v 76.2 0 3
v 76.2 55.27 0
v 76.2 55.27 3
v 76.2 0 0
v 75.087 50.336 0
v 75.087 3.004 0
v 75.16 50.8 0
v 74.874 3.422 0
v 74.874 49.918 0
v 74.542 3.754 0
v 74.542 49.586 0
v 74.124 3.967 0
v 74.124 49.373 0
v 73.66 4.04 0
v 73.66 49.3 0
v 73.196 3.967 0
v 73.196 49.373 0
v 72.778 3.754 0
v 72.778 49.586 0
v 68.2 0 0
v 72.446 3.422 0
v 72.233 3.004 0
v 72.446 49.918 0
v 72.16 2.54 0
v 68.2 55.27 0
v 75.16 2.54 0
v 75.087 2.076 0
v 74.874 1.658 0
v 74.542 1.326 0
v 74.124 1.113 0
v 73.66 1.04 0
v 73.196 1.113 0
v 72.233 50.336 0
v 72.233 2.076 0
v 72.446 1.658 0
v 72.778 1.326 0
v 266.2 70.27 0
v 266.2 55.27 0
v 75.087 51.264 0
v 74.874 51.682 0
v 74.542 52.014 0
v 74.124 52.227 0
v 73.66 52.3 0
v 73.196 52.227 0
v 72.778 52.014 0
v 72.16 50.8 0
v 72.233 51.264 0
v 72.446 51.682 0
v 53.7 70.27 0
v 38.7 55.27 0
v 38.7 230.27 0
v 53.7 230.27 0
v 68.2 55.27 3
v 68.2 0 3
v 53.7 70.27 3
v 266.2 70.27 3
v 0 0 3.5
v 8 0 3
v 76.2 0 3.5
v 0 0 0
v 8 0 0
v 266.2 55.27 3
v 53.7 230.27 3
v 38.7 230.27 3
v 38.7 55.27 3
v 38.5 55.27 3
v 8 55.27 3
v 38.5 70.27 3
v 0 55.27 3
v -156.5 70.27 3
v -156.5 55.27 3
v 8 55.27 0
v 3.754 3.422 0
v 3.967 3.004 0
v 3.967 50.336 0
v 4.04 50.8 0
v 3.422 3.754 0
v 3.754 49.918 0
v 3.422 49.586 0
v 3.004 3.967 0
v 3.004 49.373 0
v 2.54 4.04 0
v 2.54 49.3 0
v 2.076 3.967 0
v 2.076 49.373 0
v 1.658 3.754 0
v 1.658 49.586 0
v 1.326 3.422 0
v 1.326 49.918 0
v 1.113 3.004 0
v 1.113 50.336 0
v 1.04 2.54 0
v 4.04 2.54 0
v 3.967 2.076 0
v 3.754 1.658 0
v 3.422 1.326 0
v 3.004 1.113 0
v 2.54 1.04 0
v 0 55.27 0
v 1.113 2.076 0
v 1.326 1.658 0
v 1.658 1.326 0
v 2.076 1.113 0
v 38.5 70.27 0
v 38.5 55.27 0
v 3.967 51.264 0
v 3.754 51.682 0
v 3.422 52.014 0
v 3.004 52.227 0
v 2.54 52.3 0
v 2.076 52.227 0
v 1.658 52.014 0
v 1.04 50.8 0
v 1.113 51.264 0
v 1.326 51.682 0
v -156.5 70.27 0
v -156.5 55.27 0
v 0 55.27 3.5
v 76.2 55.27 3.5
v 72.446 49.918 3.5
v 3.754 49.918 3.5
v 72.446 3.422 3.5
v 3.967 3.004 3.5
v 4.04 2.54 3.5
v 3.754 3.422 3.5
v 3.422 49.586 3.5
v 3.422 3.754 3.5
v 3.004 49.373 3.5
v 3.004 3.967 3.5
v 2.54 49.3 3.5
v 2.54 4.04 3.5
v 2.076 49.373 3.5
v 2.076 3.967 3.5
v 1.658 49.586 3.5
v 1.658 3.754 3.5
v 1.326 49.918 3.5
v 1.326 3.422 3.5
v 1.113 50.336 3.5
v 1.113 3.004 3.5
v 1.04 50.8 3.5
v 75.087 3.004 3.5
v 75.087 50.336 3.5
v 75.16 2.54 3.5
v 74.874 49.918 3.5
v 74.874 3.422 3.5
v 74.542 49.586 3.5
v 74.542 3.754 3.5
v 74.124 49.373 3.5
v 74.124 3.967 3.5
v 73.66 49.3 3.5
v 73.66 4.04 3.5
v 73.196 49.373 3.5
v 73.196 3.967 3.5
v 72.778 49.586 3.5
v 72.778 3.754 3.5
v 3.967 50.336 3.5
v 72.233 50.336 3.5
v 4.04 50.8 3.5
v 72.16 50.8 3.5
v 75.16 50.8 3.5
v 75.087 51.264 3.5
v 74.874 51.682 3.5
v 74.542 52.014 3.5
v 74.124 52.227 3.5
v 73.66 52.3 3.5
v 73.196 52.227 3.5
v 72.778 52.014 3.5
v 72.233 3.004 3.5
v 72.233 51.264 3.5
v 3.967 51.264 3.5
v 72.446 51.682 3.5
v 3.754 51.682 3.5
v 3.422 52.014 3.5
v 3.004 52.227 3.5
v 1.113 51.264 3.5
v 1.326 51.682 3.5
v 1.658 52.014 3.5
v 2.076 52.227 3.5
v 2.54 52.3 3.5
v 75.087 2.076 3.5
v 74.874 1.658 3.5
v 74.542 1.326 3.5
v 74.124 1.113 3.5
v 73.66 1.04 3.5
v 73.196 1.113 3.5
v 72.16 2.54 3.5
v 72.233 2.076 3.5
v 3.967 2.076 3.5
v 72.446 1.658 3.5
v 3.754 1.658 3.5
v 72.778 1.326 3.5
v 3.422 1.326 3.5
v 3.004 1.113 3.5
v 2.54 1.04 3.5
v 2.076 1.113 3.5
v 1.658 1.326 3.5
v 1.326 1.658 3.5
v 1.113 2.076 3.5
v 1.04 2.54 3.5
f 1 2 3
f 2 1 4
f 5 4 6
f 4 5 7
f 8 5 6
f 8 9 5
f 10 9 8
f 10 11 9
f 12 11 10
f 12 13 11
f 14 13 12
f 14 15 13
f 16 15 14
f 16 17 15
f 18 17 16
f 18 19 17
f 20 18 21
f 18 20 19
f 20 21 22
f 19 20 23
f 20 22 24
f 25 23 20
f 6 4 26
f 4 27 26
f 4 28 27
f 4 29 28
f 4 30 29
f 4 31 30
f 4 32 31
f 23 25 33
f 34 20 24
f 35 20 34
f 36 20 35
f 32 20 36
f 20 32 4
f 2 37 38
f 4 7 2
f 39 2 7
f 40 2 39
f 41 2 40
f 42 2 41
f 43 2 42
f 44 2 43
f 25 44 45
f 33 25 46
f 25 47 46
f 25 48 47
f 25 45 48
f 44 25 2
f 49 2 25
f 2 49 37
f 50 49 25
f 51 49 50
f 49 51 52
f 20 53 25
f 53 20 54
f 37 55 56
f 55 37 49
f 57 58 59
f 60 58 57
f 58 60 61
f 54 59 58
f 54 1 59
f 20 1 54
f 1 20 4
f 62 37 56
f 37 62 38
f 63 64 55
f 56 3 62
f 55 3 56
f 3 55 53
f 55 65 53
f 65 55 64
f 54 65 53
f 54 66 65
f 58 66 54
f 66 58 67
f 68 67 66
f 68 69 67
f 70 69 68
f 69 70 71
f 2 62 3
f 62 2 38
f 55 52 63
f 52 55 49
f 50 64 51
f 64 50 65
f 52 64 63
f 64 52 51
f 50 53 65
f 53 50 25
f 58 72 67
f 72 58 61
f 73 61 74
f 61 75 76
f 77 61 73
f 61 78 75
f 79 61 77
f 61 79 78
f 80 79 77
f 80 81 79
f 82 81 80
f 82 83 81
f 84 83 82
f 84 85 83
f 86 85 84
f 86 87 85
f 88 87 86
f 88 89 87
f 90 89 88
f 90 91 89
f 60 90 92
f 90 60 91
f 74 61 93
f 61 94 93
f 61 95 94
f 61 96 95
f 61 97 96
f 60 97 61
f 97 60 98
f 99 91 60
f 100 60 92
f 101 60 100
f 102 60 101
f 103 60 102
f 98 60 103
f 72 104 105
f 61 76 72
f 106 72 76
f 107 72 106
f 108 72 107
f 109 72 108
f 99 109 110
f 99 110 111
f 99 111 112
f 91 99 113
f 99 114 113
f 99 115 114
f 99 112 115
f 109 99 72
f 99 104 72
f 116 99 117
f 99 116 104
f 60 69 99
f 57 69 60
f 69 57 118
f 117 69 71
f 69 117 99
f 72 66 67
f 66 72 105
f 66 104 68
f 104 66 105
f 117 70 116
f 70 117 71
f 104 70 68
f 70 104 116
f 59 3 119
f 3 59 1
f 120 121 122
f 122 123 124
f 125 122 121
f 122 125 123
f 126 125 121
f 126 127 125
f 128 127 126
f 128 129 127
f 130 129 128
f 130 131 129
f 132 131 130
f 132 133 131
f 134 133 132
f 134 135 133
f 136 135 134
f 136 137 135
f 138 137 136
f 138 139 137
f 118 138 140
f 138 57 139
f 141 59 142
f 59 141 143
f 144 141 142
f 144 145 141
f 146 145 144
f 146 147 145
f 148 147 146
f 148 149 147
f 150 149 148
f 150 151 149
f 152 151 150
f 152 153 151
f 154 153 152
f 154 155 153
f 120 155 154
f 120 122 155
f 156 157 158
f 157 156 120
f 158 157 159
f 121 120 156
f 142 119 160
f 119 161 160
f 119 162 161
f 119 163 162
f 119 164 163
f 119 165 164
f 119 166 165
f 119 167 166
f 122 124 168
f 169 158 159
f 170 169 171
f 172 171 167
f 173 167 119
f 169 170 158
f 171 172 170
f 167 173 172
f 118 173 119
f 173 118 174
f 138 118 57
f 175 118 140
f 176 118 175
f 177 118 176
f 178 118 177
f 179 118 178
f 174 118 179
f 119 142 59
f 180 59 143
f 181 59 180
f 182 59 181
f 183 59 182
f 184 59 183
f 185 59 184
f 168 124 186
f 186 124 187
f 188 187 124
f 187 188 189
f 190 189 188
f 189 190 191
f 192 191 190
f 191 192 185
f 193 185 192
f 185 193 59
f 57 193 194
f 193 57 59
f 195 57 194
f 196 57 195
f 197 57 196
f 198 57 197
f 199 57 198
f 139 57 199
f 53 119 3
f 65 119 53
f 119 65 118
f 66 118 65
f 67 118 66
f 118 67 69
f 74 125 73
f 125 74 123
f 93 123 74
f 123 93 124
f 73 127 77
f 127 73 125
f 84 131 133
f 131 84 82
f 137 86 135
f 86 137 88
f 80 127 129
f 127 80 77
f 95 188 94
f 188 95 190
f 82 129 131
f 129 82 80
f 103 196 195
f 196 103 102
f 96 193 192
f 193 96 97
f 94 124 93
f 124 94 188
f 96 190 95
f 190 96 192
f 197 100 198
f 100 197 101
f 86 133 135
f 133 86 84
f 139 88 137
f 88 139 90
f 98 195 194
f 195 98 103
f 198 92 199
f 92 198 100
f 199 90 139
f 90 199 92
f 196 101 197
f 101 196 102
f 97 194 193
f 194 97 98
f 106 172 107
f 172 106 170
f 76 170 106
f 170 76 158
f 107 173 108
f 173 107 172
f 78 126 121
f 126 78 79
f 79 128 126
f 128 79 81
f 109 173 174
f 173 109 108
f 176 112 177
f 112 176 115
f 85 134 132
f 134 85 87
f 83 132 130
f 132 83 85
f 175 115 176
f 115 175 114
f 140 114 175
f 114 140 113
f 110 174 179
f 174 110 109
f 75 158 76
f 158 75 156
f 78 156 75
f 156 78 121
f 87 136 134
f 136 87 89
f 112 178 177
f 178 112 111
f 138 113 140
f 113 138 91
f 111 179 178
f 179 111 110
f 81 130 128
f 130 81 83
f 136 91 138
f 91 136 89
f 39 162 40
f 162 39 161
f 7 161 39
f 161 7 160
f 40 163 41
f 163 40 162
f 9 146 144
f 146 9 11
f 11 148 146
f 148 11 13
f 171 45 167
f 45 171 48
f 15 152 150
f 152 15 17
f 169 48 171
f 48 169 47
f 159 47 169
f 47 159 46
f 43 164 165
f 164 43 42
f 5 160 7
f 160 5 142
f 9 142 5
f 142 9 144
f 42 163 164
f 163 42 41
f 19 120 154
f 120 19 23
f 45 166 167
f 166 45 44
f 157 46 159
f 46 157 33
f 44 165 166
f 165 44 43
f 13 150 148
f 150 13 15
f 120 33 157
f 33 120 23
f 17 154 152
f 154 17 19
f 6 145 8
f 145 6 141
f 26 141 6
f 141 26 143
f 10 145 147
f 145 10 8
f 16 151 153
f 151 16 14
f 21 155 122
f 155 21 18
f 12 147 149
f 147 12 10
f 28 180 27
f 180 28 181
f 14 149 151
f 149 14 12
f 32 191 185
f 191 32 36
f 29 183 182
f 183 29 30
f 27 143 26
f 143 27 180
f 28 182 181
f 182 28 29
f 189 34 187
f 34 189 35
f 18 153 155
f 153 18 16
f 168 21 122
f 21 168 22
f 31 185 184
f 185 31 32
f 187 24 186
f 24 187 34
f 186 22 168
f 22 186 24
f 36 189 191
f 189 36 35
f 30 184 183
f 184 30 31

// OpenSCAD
//2024 Oxford Aerospace and Rocketry Society
//Layout for the tracker / reciever PCB
//Comment out each individual part to print

$fn = 20; //20 Sides for each hole

difference(){
    union(){
        color("DodgerBlue",1) //PCB
        translate([0,0,3])
            cube([76.2,55.27,0.5]);
        
        translate([76.2-8,0,0])
            union(){
                color("ForestGreen", 1)
                    rightSide();
                color("FireBrick", 1)
                    topSide();
            }
        color("DarkSlateGray", 1)
            leftSide();
    }
        translate([2.54,2.54,0])//Mounting Holes
            cylinder(r = 1.5, h = 4);
        translate([2.54,50.8,0])
            cylinder(r = 1.5, h = 4);
        translate([73.66,50.8,0])
            cylinder(r = 1.5, h = 4);
        translate([73.66,2.54,0])
            cylinder(r = 1.5, h = 4);
}


module rightSide(){
    cube([8,55.27+15,1.5]);
    translate([8,55.27,0])
        cube([190,15,3]);
}

module topSide(){
    translate([0,0,1.5])
        cube([8,55.27+15,1.5]);
    translate([-22-7.5,55.27,0])
        cube([15,175,3]);
    translate([-22+7.5,55.27,0])
        cube([22-7.5,15,3]);
    
}

module leftSide(){
    cube([8,55.27,3]);
    translate([22-195+16.5,55.27,0])
        cube([195,15,3]);
    
}
